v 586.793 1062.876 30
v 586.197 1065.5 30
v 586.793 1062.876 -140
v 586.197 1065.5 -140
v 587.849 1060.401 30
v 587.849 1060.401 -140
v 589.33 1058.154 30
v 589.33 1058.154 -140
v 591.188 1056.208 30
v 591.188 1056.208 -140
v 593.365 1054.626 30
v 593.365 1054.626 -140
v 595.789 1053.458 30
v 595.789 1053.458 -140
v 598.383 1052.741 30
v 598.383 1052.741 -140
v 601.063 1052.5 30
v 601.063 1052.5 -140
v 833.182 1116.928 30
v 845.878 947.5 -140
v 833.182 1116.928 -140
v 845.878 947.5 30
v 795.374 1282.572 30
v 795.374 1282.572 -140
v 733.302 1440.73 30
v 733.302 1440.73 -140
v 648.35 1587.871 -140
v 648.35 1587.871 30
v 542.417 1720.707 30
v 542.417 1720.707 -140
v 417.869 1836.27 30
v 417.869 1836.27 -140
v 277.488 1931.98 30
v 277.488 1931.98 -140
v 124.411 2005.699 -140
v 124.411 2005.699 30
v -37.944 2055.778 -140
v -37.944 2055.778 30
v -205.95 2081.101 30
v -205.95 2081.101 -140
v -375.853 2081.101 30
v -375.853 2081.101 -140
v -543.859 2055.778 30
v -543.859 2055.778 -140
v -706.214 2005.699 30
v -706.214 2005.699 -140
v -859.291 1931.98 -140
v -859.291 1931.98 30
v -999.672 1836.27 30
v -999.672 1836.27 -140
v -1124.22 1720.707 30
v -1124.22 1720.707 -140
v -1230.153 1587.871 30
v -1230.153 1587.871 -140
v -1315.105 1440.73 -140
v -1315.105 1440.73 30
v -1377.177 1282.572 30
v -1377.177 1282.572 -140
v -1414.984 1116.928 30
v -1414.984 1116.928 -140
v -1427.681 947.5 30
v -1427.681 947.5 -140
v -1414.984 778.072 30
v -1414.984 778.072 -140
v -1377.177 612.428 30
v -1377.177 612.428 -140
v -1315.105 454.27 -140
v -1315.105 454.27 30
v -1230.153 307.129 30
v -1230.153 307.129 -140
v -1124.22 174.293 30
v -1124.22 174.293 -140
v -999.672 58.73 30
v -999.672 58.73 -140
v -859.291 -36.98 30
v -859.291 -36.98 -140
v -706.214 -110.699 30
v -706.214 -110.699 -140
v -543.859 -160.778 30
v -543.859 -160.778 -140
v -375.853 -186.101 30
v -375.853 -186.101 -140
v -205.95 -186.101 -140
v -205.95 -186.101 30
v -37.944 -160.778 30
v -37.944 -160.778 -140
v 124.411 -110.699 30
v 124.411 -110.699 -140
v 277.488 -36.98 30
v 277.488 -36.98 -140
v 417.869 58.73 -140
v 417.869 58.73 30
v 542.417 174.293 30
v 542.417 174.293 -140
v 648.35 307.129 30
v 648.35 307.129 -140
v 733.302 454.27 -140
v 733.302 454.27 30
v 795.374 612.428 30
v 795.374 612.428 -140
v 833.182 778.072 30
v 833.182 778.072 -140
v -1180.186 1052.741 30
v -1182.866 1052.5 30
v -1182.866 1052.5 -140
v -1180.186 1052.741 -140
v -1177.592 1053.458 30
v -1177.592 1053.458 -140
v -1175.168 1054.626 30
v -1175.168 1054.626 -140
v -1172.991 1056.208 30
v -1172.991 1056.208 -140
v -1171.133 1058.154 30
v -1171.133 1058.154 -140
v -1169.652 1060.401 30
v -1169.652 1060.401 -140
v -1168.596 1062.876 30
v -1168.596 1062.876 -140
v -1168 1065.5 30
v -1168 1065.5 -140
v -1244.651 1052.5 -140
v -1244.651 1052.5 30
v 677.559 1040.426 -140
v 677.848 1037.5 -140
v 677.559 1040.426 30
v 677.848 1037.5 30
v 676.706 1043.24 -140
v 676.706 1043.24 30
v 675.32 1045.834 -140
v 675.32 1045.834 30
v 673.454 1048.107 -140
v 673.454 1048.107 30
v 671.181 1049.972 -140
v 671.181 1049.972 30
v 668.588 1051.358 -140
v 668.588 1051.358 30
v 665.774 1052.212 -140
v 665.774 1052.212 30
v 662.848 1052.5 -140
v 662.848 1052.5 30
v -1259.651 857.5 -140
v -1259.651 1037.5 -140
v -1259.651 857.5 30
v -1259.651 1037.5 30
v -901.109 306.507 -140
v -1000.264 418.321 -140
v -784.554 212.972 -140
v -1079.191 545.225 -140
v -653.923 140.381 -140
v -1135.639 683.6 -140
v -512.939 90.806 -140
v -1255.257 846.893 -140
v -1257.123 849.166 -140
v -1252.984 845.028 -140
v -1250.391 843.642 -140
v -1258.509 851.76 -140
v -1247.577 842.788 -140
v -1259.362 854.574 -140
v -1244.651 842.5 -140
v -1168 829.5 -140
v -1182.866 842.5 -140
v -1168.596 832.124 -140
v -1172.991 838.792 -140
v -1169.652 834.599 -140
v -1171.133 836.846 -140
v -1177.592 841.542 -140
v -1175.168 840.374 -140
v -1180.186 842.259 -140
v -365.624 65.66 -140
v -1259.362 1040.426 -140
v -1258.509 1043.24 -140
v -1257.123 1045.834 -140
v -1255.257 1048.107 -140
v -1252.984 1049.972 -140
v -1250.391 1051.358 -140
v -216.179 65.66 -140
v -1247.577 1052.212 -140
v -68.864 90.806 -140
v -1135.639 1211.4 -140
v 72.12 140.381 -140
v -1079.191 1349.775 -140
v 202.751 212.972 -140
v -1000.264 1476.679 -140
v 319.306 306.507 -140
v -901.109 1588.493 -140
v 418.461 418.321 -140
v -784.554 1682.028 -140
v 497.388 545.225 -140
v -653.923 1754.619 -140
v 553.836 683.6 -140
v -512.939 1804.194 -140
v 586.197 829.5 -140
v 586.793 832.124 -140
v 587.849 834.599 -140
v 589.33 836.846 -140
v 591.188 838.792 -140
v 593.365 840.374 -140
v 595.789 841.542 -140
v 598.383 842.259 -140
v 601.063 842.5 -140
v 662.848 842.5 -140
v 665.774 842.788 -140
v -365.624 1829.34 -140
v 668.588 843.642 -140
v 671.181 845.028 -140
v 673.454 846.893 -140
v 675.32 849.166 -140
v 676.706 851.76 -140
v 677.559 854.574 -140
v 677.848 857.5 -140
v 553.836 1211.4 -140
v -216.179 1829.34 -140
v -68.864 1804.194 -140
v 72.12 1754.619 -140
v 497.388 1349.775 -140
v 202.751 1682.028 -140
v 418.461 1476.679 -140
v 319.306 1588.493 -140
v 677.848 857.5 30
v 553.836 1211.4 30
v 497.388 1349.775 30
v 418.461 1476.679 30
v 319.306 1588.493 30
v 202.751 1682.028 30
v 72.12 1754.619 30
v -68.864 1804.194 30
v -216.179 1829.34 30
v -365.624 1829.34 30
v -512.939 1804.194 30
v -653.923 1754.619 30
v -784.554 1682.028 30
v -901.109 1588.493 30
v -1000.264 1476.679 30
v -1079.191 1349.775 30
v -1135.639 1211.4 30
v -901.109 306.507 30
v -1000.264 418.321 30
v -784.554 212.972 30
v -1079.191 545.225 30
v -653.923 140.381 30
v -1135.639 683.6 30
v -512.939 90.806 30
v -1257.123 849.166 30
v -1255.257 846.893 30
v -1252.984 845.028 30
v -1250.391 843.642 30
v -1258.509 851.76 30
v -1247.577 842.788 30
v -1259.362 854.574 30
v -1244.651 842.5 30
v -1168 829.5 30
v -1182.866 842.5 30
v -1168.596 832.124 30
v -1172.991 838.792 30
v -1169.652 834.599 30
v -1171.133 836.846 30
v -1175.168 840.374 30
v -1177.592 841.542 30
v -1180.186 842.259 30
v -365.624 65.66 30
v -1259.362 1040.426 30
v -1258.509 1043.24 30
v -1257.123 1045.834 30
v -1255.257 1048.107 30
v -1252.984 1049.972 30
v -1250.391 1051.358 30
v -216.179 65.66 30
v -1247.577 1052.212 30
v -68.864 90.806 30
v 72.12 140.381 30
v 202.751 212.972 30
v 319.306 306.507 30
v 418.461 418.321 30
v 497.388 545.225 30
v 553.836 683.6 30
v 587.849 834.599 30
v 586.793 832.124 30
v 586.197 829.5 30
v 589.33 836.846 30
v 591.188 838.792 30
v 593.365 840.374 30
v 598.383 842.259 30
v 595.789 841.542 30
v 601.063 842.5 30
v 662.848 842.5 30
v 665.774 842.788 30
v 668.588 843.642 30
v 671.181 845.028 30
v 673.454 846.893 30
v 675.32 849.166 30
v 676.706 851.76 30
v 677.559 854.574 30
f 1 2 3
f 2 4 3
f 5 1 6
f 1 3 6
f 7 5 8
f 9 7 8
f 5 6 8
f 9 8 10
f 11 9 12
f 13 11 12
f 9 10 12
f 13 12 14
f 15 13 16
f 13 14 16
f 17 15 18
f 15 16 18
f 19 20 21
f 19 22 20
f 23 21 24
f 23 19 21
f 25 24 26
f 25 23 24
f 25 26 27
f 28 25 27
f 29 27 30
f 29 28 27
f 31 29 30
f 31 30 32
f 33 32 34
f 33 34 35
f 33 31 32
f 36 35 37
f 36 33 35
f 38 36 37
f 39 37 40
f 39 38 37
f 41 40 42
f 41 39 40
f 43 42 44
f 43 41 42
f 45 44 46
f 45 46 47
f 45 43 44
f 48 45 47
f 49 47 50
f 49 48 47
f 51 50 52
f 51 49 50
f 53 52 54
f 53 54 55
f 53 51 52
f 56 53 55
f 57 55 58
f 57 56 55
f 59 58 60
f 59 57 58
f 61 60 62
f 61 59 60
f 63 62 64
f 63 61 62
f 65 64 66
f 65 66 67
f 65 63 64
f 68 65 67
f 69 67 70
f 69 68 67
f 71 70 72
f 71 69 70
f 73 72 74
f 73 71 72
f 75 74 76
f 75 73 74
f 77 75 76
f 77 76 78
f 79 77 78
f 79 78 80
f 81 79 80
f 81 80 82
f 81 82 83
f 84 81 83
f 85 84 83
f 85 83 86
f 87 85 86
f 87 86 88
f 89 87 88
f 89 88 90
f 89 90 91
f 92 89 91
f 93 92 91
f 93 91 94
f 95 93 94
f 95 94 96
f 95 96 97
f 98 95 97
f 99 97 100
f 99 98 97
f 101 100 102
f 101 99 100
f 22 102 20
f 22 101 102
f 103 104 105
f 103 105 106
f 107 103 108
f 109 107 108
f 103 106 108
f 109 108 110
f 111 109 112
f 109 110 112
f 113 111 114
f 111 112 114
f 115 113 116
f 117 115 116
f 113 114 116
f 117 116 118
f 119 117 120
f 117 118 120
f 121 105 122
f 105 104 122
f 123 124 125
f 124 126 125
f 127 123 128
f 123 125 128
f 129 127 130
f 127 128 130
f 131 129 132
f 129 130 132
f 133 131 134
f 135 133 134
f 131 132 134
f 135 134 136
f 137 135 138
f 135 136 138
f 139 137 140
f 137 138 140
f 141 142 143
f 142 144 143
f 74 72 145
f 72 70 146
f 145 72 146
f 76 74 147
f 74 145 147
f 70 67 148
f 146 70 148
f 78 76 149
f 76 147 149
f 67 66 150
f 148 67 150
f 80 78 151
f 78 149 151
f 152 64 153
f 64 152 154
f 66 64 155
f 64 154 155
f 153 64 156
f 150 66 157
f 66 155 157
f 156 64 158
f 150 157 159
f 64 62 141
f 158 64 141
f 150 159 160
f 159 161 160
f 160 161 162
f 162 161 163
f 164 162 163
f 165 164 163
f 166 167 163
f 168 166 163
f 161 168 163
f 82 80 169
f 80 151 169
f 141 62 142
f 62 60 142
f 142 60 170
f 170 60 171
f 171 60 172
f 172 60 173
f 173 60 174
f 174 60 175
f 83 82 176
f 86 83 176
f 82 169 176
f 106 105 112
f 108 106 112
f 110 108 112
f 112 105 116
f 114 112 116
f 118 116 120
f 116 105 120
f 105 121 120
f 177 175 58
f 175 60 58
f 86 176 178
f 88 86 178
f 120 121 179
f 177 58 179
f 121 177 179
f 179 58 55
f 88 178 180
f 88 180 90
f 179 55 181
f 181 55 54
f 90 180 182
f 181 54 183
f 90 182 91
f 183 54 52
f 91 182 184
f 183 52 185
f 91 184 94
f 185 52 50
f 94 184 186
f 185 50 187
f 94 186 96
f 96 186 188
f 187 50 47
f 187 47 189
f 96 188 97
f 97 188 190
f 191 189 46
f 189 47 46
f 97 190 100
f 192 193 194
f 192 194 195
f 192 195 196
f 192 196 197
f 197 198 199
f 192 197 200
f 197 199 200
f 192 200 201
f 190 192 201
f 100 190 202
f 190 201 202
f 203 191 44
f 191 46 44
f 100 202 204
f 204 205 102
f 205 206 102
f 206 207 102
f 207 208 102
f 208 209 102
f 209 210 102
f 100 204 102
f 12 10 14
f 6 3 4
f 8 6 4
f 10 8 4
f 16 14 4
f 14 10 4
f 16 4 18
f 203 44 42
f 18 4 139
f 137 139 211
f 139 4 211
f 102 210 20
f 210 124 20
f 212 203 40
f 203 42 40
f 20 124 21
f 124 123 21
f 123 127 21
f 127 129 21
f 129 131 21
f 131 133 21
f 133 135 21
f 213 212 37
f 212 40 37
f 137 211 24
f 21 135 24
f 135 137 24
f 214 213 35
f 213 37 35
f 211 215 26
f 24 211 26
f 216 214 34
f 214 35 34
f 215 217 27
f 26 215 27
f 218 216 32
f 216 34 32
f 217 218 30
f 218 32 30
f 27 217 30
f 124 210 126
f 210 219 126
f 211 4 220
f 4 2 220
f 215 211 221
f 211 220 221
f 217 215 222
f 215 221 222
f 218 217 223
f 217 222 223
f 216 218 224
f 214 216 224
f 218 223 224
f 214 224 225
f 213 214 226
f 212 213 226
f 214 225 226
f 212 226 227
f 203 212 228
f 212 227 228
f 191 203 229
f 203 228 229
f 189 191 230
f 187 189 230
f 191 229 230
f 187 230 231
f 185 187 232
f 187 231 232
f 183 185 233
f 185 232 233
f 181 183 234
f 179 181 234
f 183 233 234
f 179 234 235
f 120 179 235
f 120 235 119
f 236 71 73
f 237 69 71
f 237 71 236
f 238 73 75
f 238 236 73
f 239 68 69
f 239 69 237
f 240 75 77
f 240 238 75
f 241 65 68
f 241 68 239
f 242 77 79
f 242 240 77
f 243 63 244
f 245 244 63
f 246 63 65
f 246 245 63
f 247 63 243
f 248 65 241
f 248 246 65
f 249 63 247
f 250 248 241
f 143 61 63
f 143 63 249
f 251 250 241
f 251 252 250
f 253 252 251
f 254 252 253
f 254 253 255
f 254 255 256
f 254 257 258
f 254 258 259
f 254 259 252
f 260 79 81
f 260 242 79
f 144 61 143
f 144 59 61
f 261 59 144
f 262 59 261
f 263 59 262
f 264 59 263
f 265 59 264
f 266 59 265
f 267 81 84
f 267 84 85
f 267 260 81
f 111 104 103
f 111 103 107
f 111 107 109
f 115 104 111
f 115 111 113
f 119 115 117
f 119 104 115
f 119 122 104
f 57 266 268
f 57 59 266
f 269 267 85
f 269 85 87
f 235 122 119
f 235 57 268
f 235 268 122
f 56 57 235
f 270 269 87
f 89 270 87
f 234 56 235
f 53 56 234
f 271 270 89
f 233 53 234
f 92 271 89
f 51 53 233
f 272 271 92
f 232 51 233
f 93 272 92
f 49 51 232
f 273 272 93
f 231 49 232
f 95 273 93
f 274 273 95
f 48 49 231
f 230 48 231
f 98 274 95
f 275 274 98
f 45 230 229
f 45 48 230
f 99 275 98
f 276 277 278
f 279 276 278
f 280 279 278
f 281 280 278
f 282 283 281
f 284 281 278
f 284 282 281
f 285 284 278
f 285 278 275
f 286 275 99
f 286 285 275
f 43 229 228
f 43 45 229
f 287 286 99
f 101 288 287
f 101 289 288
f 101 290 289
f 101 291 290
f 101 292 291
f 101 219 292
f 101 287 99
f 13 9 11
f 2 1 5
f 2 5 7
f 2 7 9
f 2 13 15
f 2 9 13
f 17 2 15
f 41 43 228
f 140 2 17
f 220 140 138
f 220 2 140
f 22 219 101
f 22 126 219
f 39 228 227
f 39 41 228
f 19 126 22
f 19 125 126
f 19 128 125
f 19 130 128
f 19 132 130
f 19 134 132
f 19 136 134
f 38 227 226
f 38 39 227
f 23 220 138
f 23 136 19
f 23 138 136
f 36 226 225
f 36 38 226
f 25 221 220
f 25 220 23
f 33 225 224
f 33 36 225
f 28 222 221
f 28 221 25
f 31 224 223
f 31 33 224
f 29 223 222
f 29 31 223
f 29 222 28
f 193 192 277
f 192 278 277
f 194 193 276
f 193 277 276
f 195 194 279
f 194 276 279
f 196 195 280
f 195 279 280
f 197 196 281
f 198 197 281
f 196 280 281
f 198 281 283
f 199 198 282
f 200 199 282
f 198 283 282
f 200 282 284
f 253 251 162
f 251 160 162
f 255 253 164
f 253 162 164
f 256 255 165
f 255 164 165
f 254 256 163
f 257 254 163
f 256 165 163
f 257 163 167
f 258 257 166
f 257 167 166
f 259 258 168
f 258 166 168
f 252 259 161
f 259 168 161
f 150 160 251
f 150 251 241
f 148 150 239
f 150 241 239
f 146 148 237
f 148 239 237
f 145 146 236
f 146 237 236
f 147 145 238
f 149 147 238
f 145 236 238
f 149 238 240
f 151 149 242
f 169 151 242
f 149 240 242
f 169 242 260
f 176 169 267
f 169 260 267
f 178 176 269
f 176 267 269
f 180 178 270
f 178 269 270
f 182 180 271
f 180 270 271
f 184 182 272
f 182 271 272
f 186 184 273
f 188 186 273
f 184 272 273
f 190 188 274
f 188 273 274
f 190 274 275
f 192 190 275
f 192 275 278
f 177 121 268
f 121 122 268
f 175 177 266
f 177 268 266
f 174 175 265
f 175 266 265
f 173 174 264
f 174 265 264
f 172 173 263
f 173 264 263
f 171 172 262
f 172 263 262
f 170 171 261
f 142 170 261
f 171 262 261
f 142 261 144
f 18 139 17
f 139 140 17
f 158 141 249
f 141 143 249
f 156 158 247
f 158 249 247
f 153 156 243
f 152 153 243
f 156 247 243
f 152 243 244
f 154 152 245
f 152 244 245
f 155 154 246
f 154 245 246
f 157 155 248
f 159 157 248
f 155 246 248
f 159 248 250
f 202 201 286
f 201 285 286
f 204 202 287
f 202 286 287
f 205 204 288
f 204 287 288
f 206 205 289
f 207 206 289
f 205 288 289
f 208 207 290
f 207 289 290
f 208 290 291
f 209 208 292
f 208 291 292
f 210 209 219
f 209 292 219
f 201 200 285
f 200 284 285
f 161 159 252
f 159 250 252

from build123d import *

# Parameters (mm, degrees)
IZIM1_R                          = 1136.77987901
Y_KSEKLIK_EKSTR_ZYON1_DEPTH      = 30
Y_KSEKLIK_EKSTR_ZYON1_DEPTH_BACK = 140
RADYUS1_R                        = 15


with BuildPart() as part:
    # Çizim1 → Yükseklik-Ekstrüzyon1 (new body, two sides)
    with BuildSketch(Plane.XY) as y_kseklik_ekstr_zyon1_sk:
        with Locations((-290.901455233, 947.5)):
            Circle(IZIM1_R)
        with BuildLine():
            Line((587.84765572, 842.5), (662.84765572, 842.5))
            ThreePointArc((662.84765572, 842.5), (673.454257437, 846.893398282), (677.84765572, 857.5))
            Line((677.84765572, 857.5), (677.84765572, 1037.5))
            ThreePointArc((677.84765572, 1037.5), (673.454257437, 1048.106601718), (662.84765572, 1052.5))
            Line((662.84765572, 1052.5), (587.84765572, 1052.5))
            ThreePointArc((587.84765572, 1052.5), (-290.901455233, 1832.5), (-1169.650566186, 1052.5))
            Line((-1169.650566186, 1052.5), (-1244.650566186, 1052.5))
            ThreePointArc((-1244.650566186, 1052.5), (-1255.257167903, 1048.106601718), (-1259.650566186, 1037.5))
            Line((-1259.650566186, 1037.5), (-1259.650566186, 857.5))
            ThreePointArc((-1259.650566186, 857.5), (-1255.257167903, 846.893398282), (-1244.650566186, 842.5))
            Line((-1244.650566186, 842.5), (-1169.650566186, 842.5))
            ThreePointArc((-1169.650566186, 842.5), (-290.901455233, 62.5), (587.84765572, 842.5))
        make_face(mode=Mode.SUBTRACT)
    extrude(amount=Y_KSEKLIK_EKSTR_ZYON1_DEPTH)
    extrude(y_kseklik_ekstr_zyon1_sk.sketch, amount=-Y_KSEKLIK_EKSTR_ZYON1_DEPTH_BACK)

    # Radyus1
    radyus1_edges = [part.edges().sort_by_distance(p)[0] for p in [
        (587.84765572, 842.5, -70),
        (-1169.650566186, 842.5, -70),
        (-1169.650566186, 1052.5, -70),
        (587.84765572, 1052.5, -70),
    ]]
    fillet(radyus1_edges, radius=RADYUS1_R)


solid = part.part
